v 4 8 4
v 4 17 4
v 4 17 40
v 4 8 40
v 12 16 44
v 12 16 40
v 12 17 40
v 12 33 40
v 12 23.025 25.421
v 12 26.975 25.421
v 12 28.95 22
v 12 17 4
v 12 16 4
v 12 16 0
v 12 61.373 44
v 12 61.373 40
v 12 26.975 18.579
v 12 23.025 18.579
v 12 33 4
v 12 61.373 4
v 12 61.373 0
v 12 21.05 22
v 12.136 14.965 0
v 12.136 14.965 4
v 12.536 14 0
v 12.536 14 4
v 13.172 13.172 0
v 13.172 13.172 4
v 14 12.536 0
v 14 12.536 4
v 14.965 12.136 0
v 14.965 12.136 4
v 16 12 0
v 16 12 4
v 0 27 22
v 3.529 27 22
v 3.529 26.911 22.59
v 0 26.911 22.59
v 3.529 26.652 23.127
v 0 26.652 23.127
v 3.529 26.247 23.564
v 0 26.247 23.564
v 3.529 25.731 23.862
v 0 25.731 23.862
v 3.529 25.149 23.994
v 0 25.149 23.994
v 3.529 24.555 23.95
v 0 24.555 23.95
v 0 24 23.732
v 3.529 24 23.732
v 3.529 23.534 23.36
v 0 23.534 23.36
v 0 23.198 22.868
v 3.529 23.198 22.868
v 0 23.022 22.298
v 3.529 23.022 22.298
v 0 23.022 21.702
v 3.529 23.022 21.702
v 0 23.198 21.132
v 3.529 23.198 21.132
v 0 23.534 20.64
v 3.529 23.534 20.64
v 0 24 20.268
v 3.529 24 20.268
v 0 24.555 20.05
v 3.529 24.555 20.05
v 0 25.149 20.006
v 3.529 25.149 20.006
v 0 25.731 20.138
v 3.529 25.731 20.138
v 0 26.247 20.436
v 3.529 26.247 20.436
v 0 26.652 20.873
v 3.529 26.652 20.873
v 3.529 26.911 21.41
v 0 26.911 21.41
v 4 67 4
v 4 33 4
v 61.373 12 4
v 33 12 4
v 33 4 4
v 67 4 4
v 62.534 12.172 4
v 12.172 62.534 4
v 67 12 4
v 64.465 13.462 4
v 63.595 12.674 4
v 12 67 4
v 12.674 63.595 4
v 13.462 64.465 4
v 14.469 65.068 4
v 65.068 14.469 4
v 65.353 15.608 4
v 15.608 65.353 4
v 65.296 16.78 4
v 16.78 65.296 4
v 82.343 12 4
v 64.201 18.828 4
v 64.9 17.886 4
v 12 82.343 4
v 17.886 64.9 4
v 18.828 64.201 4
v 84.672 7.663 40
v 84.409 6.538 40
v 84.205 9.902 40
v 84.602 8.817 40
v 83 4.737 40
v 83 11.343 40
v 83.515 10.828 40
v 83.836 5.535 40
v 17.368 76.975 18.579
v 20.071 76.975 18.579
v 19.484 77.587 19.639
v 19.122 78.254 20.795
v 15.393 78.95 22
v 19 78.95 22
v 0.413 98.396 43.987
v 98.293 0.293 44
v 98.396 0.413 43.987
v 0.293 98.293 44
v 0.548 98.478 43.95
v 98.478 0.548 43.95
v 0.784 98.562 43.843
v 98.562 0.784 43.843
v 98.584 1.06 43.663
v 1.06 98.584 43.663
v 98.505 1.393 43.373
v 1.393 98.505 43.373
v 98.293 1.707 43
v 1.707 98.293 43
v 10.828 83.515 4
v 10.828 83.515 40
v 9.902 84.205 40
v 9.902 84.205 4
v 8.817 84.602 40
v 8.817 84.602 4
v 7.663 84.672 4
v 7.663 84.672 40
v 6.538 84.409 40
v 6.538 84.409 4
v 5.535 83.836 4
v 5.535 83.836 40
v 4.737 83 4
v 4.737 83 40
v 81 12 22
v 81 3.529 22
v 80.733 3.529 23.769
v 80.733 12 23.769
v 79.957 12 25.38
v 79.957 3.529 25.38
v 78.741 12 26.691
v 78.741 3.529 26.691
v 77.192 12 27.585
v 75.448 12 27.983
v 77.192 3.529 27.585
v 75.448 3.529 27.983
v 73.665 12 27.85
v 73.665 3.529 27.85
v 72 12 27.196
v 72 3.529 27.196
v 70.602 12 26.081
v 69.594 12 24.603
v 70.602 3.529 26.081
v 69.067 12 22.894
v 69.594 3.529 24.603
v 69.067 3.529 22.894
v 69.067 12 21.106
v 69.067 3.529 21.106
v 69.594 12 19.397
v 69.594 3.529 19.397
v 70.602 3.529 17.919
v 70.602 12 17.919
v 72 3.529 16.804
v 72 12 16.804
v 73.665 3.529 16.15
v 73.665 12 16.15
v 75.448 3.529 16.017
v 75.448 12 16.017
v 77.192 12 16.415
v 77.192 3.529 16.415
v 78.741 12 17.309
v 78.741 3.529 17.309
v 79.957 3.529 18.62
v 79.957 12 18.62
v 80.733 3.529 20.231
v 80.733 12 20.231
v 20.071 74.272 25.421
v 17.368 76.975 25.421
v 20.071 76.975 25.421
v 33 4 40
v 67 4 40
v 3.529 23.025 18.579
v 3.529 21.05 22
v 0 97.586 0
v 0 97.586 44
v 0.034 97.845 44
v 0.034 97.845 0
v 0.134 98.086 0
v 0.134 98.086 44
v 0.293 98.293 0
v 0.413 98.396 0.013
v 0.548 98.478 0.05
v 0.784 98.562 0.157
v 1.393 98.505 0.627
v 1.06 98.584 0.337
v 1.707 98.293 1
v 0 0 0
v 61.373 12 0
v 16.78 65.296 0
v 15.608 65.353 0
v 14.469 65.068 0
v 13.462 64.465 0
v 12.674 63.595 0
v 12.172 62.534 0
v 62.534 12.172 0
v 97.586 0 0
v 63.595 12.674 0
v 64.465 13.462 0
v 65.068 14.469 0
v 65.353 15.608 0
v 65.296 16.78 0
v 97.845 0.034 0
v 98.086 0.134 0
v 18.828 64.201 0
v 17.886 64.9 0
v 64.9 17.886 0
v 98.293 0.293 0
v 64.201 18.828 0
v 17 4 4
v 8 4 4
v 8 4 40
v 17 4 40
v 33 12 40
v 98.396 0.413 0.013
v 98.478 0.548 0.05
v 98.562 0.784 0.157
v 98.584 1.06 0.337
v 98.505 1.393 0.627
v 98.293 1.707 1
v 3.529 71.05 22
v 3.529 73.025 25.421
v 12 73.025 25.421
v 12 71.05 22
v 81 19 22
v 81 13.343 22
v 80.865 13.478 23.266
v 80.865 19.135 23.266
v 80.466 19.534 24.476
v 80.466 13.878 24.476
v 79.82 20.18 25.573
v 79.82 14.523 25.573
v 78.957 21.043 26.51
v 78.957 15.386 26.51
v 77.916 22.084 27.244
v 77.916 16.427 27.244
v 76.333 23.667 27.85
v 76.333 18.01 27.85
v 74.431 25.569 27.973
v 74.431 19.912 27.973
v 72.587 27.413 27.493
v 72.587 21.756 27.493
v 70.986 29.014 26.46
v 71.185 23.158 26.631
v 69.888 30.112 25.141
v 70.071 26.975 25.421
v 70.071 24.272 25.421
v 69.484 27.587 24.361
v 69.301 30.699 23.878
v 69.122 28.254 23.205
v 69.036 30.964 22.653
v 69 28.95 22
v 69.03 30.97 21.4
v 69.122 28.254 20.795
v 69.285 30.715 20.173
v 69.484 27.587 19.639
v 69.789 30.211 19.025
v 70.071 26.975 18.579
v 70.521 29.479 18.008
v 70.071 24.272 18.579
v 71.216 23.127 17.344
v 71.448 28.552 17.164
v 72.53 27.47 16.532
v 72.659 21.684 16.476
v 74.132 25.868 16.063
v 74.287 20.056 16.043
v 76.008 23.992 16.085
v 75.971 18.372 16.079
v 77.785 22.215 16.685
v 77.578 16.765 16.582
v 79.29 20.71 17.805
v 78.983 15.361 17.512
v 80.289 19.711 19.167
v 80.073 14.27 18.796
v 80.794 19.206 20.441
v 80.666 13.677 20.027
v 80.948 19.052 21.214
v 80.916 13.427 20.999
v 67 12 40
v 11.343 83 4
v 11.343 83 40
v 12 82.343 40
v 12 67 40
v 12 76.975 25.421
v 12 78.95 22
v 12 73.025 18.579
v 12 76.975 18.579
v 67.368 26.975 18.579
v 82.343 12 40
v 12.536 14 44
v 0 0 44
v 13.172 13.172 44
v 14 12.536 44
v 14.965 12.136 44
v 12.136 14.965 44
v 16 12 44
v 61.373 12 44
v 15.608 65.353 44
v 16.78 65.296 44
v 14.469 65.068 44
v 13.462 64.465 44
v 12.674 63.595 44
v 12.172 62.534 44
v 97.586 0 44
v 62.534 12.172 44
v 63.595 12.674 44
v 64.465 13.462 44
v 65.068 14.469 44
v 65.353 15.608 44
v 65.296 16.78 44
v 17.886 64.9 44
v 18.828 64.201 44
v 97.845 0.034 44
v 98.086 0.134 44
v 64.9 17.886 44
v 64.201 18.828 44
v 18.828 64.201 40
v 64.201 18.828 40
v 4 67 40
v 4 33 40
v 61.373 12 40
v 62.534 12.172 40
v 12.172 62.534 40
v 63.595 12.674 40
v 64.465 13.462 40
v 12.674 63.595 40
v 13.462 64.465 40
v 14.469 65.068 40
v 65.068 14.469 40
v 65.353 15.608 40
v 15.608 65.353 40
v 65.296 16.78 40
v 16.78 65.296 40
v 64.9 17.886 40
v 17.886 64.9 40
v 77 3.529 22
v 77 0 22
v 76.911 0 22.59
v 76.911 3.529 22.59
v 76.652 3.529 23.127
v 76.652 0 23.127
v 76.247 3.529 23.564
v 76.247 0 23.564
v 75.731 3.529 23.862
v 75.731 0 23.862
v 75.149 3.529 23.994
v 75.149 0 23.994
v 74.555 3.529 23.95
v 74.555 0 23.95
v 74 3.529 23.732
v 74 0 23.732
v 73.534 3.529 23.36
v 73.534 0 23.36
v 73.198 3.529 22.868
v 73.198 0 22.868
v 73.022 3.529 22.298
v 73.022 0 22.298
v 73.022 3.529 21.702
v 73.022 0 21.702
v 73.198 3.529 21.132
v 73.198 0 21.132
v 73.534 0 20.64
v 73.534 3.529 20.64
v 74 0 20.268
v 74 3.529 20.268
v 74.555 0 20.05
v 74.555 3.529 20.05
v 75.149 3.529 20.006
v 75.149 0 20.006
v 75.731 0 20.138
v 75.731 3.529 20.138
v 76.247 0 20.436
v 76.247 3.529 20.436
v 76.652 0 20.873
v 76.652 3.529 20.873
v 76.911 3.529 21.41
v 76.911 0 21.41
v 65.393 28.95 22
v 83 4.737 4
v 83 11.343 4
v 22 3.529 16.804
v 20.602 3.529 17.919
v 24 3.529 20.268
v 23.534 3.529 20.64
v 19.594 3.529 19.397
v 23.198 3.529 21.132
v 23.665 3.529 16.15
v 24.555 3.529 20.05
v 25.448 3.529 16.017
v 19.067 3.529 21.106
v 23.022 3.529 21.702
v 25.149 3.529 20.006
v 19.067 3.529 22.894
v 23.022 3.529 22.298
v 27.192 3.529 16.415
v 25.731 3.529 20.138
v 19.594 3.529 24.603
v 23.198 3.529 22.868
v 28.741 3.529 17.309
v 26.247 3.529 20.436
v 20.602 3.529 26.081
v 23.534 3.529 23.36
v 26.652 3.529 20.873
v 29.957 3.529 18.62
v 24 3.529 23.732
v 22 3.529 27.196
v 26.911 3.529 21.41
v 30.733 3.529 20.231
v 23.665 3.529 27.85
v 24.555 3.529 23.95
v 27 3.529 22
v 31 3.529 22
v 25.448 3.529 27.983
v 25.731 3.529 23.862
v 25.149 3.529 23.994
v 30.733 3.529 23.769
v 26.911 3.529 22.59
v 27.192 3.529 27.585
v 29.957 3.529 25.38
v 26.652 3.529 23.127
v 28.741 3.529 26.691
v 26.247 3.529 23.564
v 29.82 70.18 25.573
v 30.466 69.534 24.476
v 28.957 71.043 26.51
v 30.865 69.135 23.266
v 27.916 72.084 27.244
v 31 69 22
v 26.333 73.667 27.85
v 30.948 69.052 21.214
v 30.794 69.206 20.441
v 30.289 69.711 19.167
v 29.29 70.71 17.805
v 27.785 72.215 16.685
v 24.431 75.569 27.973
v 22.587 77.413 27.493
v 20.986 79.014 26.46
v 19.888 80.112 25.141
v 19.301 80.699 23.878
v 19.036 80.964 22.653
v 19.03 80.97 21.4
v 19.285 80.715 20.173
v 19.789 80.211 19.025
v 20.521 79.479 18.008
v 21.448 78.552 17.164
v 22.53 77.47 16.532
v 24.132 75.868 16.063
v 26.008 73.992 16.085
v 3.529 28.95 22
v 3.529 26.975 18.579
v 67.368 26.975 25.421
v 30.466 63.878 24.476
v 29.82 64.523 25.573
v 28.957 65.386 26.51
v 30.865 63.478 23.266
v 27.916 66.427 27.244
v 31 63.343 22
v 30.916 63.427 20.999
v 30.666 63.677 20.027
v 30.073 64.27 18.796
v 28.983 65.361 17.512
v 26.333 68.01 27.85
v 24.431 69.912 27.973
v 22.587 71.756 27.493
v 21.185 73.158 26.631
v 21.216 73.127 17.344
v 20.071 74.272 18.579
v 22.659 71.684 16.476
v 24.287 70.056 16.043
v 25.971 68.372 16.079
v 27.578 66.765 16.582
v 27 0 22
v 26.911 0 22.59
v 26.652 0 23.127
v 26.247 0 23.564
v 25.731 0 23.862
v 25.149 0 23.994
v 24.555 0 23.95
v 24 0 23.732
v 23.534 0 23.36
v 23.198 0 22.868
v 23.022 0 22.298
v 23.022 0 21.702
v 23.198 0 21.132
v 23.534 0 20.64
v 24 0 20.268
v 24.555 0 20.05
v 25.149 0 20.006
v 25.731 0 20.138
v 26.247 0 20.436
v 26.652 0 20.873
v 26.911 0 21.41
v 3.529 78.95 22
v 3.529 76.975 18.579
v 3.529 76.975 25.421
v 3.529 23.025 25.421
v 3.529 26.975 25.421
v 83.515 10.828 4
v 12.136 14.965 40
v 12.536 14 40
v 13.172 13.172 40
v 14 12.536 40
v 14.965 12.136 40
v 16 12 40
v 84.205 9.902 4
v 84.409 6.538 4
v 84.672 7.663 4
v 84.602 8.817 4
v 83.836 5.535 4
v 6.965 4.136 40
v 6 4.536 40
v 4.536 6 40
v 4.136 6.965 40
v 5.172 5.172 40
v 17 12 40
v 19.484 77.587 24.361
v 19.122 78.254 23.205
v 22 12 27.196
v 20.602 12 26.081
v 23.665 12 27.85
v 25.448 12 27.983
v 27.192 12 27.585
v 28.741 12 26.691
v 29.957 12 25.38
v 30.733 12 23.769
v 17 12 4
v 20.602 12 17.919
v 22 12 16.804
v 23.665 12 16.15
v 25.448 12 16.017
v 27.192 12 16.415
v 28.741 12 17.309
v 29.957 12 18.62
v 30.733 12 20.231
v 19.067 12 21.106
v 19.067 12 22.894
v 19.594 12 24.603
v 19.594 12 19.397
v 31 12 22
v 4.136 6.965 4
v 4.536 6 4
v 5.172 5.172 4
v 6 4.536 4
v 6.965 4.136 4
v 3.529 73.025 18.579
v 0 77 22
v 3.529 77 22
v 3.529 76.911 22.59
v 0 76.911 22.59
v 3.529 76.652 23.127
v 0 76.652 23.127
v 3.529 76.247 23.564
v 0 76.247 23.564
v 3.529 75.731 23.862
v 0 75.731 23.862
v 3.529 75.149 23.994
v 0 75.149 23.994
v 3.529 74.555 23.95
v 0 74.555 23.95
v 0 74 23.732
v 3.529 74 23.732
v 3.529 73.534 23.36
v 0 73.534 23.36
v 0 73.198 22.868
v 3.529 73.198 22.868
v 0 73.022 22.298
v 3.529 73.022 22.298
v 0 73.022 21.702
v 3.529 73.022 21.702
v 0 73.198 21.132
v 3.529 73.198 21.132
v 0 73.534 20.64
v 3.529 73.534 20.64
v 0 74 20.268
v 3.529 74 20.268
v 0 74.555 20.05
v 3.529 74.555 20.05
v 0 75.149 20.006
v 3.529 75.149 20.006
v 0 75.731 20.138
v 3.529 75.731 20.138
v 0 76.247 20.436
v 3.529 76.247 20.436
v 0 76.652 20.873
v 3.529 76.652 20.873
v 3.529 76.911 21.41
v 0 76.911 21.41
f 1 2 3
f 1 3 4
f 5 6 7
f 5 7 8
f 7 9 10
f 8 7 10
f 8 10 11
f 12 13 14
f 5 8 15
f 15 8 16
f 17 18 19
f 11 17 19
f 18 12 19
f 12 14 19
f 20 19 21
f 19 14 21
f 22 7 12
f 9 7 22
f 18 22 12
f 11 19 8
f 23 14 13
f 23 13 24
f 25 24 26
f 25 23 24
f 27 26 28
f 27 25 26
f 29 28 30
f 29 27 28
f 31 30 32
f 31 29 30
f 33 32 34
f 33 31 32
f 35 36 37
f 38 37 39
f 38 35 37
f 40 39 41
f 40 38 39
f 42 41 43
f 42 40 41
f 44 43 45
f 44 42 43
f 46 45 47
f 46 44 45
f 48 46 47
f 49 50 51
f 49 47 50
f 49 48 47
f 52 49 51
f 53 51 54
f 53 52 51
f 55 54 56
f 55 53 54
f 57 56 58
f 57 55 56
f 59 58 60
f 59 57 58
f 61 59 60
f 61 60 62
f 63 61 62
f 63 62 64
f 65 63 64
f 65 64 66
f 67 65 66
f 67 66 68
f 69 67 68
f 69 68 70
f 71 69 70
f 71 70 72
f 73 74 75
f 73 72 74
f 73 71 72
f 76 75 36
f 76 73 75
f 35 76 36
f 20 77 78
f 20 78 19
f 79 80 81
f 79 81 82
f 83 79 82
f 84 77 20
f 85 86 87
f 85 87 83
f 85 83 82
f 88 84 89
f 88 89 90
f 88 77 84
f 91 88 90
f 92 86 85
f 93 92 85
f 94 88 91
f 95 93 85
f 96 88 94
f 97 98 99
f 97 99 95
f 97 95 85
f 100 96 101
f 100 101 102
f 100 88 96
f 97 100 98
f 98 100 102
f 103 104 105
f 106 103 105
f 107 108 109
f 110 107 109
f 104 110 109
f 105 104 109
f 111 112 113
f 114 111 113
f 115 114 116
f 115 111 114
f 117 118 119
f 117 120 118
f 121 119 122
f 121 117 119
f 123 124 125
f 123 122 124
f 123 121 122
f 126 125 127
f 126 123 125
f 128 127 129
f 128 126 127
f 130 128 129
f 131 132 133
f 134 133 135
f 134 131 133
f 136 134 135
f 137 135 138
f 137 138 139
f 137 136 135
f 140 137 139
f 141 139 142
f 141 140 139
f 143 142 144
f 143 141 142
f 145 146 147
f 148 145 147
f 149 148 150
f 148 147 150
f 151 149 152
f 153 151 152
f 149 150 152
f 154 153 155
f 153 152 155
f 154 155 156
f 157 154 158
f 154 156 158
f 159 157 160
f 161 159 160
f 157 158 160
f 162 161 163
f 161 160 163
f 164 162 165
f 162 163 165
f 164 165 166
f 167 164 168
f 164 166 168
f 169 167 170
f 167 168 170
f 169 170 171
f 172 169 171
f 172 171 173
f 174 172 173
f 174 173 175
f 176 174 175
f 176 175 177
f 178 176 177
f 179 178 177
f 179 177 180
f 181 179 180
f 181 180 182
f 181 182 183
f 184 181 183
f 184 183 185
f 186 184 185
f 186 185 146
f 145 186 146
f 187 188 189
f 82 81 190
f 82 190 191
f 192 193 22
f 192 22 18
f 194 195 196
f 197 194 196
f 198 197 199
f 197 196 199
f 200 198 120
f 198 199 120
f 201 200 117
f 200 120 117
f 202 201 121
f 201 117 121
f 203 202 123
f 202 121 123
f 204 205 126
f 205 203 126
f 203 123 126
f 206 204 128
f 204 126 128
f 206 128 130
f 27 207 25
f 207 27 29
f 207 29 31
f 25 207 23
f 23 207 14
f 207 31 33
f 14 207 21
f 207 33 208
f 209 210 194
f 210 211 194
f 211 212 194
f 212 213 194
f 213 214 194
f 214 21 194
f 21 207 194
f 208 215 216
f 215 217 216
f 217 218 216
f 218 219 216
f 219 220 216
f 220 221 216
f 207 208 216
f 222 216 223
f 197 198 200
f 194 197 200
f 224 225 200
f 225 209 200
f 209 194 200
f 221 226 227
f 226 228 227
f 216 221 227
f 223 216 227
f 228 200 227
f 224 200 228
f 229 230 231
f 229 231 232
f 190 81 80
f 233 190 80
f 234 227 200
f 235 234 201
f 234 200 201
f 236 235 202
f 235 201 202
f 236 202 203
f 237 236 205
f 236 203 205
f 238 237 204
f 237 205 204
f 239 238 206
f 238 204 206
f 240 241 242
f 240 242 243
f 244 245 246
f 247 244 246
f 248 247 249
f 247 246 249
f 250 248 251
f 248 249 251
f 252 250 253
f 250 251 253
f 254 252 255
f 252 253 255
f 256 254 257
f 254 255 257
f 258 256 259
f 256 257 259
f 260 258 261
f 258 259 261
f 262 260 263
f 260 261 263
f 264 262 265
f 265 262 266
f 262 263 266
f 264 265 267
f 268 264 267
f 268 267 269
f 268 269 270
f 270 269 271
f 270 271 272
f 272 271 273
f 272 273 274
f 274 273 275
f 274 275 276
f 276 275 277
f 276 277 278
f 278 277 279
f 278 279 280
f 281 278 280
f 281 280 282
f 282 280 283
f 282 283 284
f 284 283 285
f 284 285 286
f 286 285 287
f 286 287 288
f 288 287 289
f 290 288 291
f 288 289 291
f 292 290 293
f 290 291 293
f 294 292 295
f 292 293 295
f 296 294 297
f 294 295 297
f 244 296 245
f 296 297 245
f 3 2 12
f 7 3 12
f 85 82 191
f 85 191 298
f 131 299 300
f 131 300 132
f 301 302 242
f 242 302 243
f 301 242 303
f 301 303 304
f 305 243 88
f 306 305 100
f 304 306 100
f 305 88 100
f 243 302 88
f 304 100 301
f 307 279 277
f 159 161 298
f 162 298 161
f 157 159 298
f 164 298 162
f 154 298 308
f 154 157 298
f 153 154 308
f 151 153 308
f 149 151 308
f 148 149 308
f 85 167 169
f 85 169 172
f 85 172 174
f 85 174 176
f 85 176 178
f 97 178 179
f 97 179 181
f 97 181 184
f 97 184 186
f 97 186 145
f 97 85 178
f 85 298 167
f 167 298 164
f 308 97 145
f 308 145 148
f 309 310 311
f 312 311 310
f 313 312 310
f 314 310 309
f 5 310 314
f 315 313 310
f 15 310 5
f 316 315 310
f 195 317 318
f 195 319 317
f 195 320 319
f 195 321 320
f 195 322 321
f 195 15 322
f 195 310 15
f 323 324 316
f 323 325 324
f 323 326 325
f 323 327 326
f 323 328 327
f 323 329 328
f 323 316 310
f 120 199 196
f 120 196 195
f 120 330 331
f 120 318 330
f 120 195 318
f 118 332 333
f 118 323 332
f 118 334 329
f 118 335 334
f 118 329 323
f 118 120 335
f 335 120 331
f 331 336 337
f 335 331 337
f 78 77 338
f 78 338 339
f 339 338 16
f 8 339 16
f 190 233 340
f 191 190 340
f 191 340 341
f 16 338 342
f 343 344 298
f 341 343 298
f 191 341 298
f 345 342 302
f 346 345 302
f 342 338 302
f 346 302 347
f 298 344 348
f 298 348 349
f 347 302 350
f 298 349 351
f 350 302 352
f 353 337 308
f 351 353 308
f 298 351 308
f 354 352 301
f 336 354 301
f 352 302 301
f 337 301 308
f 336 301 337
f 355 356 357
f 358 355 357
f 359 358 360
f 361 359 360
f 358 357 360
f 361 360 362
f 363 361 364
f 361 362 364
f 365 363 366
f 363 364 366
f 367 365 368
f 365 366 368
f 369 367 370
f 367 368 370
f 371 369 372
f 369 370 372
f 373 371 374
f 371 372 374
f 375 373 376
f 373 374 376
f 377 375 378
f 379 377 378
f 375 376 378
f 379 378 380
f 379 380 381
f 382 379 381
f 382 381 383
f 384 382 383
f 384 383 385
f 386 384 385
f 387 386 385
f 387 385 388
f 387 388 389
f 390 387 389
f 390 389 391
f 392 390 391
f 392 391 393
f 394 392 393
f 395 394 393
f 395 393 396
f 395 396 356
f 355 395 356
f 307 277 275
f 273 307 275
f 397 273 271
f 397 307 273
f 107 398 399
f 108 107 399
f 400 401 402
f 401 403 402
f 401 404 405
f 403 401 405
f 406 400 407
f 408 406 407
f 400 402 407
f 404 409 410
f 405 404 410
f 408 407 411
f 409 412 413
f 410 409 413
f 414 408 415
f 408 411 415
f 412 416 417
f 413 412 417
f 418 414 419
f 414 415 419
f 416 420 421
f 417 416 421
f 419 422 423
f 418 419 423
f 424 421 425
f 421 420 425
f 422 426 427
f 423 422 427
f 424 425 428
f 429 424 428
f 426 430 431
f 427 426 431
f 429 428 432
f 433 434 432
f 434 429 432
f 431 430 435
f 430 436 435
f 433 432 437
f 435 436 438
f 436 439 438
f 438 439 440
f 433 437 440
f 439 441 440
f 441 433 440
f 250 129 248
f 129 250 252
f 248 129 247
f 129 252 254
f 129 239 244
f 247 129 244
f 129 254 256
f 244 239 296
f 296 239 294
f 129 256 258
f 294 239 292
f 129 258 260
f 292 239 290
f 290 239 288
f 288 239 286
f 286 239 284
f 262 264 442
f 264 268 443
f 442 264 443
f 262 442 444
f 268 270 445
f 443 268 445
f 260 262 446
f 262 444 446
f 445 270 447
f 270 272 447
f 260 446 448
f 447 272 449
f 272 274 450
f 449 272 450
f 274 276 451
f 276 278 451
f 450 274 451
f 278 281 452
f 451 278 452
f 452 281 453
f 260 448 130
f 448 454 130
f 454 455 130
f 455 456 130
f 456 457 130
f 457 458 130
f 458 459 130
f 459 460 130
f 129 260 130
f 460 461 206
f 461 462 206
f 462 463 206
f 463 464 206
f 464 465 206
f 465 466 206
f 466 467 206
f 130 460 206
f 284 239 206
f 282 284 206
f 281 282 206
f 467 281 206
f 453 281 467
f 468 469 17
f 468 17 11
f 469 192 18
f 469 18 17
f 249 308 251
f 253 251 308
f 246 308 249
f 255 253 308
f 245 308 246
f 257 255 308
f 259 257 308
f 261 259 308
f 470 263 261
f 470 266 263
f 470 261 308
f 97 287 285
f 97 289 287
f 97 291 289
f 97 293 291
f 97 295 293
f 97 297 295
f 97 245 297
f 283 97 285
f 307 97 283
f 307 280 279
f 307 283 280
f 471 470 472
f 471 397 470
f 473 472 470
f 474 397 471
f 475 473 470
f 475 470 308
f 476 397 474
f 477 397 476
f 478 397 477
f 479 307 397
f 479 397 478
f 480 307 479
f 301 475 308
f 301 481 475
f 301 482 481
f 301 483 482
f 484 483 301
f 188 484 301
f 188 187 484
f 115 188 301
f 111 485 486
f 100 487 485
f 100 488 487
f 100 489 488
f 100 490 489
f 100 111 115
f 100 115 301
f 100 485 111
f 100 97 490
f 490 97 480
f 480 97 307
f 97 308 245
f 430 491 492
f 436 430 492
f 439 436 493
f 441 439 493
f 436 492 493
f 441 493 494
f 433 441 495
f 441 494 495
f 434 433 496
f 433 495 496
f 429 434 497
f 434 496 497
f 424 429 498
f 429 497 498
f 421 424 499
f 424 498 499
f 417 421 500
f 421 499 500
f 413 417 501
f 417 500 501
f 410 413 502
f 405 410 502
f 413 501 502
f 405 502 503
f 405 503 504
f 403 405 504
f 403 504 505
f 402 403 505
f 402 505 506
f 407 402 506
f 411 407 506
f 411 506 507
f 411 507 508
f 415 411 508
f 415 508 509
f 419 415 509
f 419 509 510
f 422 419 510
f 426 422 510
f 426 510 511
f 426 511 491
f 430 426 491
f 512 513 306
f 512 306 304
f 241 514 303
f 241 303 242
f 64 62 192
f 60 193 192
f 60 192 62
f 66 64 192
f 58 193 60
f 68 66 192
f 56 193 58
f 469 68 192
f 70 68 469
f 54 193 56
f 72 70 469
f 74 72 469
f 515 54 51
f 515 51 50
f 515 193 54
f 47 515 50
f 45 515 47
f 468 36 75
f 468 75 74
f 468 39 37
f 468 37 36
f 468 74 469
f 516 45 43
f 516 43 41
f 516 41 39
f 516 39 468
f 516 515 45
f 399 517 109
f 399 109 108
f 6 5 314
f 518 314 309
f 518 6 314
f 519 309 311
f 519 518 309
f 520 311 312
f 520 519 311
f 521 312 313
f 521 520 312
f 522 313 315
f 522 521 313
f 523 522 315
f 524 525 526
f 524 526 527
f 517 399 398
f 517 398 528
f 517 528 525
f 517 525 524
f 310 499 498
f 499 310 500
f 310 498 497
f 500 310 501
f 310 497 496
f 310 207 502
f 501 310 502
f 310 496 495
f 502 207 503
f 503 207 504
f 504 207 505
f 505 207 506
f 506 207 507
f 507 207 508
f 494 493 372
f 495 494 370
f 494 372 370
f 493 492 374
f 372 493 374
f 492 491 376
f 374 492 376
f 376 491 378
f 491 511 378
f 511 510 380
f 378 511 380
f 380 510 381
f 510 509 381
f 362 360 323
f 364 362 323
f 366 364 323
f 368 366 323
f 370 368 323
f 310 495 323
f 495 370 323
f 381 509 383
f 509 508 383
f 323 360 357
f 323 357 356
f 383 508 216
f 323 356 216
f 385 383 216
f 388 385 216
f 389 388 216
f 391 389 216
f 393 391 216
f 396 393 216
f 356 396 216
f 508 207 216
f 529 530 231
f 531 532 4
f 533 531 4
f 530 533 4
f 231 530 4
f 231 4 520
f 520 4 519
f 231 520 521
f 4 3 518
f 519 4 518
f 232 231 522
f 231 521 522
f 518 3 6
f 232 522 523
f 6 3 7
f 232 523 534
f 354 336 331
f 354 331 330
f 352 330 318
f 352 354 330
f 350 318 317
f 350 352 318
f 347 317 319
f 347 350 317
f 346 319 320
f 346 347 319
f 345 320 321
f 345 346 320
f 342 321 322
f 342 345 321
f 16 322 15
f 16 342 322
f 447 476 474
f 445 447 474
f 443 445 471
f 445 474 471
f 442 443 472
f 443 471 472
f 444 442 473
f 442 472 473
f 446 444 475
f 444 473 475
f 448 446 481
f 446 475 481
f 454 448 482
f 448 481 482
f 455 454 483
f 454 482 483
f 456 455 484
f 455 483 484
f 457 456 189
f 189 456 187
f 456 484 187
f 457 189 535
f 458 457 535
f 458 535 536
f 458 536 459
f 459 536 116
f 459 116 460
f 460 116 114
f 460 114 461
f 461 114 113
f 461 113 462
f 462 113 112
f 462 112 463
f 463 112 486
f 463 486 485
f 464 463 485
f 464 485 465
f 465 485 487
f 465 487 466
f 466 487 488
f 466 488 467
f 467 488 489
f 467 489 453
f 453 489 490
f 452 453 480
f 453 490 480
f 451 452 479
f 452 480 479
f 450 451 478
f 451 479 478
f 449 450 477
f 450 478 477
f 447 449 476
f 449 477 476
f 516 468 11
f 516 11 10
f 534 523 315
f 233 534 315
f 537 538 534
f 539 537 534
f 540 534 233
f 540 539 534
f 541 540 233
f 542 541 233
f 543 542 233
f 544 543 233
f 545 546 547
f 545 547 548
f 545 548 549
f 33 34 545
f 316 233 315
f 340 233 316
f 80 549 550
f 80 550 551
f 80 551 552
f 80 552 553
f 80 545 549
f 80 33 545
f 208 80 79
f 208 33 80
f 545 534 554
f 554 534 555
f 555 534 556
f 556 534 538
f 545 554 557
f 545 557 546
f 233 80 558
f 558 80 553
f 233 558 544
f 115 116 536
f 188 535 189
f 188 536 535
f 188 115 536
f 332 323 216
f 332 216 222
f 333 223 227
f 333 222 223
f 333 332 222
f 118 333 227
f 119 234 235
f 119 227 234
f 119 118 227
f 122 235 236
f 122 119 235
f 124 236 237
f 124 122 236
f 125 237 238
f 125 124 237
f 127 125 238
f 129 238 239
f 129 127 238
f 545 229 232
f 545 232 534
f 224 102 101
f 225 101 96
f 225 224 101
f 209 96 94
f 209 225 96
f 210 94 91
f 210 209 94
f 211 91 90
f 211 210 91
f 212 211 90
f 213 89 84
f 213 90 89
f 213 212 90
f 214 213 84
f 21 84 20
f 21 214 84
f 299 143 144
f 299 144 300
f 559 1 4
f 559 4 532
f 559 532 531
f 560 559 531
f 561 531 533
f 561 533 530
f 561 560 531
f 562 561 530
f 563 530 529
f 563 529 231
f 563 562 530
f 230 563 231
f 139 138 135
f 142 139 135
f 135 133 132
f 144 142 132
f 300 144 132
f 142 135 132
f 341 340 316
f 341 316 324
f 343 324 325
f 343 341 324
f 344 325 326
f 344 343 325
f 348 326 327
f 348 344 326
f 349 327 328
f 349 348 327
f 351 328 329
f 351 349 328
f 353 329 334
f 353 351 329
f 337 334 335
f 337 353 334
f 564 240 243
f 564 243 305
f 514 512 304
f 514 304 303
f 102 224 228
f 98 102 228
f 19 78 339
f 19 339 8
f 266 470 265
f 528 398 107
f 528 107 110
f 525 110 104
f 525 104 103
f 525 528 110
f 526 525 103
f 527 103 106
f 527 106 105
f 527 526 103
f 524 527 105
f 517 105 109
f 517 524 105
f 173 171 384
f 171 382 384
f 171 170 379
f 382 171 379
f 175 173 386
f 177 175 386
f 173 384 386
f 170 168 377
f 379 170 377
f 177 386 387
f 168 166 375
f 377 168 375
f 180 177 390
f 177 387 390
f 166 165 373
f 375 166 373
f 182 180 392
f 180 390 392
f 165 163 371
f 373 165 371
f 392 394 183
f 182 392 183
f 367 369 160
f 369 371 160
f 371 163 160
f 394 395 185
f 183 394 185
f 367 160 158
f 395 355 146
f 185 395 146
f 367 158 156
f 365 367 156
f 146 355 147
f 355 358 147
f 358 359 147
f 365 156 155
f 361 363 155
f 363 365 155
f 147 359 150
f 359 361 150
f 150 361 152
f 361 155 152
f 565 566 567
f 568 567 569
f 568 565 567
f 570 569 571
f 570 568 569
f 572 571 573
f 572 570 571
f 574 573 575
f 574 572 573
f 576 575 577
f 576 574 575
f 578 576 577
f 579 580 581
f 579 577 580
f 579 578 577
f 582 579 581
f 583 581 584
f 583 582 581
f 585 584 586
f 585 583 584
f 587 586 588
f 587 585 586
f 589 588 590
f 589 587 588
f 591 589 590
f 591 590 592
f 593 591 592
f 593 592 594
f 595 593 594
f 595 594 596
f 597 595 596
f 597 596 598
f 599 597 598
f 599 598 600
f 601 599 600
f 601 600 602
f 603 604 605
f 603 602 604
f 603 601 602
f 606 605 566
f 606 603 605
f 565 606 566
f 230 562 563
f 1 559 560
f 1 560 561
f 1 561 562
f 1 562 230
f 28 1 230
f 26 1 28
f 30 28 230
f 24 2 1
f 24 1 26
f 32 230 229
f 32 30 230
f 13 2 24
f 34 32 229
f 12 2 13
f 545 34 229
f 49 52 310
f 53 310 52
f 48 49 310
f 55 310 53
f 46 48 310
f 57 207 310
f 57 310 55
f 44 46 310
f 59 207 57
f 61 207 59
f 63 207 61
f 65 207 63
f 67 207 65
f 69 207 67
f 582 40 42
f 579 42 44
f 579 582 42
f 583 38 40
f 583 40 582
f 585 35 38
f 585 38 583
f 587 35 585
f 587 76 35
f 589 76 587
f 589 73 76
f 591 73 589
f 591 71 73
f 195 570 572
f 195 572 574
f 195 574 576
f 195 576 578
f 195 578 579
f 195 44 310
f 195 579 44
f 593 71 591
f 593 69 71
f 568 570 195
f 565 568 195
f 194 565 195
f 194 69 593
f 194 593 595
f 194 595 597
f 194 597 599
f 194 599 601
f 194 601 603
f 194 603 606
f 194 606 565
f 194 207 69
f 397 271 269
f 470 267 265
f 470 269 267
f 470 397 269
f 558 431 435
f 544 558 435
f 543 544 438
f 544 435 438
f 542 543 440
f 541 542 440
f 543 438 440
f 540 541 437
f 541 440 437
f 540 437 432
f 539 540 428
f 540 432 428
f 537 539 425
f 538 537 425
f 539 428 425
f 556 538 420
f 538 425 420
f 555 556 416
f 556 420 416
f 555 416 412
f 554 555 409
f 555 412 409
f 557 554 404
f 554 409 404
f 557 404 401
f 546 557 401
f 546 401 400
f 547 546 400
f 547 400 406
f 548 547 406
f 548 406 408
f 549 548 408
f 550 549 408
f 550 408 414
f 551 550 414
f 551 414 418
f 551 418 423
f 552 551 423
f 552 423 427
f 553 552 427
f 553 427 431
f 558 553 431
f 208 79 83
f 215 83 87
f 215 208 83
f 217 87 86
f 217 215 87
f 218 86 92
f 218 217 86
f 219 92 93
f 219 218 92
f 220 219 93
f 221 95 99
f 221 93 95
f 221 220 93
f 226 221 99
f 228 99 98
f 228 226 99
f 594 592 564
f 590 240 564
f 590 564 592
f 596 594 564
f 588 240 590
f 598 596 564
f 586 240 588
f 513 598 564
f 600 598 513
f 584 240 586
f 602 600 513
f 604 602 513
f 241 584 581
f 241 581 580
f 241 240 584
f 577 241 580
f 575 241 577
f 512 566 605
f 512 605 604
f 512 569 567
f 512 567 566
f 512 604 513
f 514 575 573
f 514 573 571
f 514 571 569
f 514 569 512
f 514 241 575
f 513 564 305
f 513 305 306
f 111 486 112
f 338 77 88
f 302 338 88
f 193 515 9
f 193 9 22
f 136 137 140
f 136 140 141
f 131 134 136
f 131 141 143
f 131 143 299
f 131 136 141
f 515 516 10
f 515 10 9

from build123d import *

# Parameters (mm, degrees)
PAD003_DEPTH    = 44
POCKET007_DEPTH = 36
SKETCH025_W     = 12
SKETCH025_H     = 16
SKETCH025_W_2   = 16
SKETCH025_H_2   = 12
PAD004_DEPTH    = 44
SKETCH026_R     = 2
POCKET008_DEPTH = 100
SKETCH027_R     = 6
POCKET009_DEPTH = 100
SKETCH028_R     = 2
POCKET010_DEPTH = 100
POCKET011_DEPTH = 100
FILLET007_R     = 1


with BuildPart() as part:
    # Sketch023 → Pad003 (new body)
    with BuildSketch(Plane.XY):
        Polygon((0, 100), (0, 0), (100, 0), align=None)
        with BuildLine():
            Line((12, 16), (12, 61.372583))
            ThreePointArc((18.828427, 64.20101), (14.469266, 65.068101), (12, 61.372583))
            Line((18.828427, 64.20101), (64.20101, 18.828427))
            ThreePointArc((61.372583, 12), (65.068101, 14.469266), (64.20101, 18.828427))
            Line((16, 12), (61.372583, 12))
            ThreePointArc((12, 16), (13.171573, 13.171573), (16, 12))
        make_face(mode=Mode.SUBTRACT)
    extrude(amount=PAD003_DEPTH)

    # Sketch024 → Pocket007 (cut)
    with BuildSketch(Plane(origin=(-1, 0, 4), x_dir=(1, 0, 0), z_dir=(0, 0, 1))):
        with BuildLine():
            Line((5, 80.686292), (5, 8))
            ThreePointArc((5, 8), (6.171573, 5.171573), (9, 4))
            Line((9, 4), (81.686292, 4))
            ThreePointArc((81.686292, 4), (85.38181, 6.469266), (84.514719, 10.828427))
            Line((84.514719, 10.828427), (11.828427, 83.514719))
            ThreePointArc((11.828427, 83.514719), (7.469266, 84.38181), (5, 80.686292))
        make_face()
    extrude(amount=POCKET007_DEPTH, mode=Mode.SUBTRACT)

    # Sketch025 → Pad004 (join)
    with BuildSketch(Plane.XY):
        with Locations((6, 75)):
            Rectangle(SKETCH025_W, SKETCH025_H)
        with Locations((6, 25)):
            Rectangle(SKETCH025_W, SKETCH025_H)
        with Locations((25, 6)):
            Rectangle(SKETCH025_W_2, SKETCH025_H_2)
        with Locations((75, 6)):
            Rectangle(SKETCH025_W_2, SKETCH025_H_2)
    extrude(amount=PAD004_DEPTH)

    # Sketch026 → Pocket008 (cut)
    with BuildSketch(Plane.XZ):
        with Locations((25, 22)):
            Circle(SKETCH026_R)
        with Locations((75, 22)):
            Circle(SKETCH026_R)
    extrude(amount=-POCKET008_DEPTH, mode=Mode.SUBTRACT)

    # Sketch027 → Pocket009 (cut)
    with BuildSketch(Plane.XZ.offset(-3.529412)):
        with Locations((25, 22)):
            Circle(SKETCH027_R)
        with Locations((75, 22)):
            Circle(SKETCH027_R)
    extrude(amount=-POCKET009_DEPTH, mode=Mode.SUBTRACT)

    # Sketch028 → Pocket010 (cut)
    with BuildSketch(Plane.YZ):
        with Locations((75, 22)):
            Circle(SKETCH028_R)
        with Locations((25, 22)):
            Circle(SKETCH028_R)
    extrude(amount=POCKET010_DEPTH, mode=Mode.SUBTRACT)

    # Sketch029 → Pocket011 (cut)
    with BuildSketch(Plane.YZ.offset(3.529412)):
        Polygon((21.05, 21.999978), (23.025, 18.579178), (26.975, 18.579178), (28.95, 21.999978), (26.975, 25.420778), (23.025, 25.420778), align=None)
        Polygon((76.975, 25.4208), (73.025, 25.4208), (71.05, 22), (73.025, 18.5792), (76.975, 18.5792), (78.95, 22), align=None)
    extrude(amount=POCKET011_DEPTH, mode=Mode.SUBTRACT)

    # Fillet007
    fillet007_edges = [part.edges().sort_by_distance(p)[0] for p in [
        (50, 50, 44),
        (50, 50, 0),
        (100, 0, 22),
        (0, 100, 22),
    ]]
    fillet(fillet007_edges, radius=FILLET007_R)


solid = part.part
